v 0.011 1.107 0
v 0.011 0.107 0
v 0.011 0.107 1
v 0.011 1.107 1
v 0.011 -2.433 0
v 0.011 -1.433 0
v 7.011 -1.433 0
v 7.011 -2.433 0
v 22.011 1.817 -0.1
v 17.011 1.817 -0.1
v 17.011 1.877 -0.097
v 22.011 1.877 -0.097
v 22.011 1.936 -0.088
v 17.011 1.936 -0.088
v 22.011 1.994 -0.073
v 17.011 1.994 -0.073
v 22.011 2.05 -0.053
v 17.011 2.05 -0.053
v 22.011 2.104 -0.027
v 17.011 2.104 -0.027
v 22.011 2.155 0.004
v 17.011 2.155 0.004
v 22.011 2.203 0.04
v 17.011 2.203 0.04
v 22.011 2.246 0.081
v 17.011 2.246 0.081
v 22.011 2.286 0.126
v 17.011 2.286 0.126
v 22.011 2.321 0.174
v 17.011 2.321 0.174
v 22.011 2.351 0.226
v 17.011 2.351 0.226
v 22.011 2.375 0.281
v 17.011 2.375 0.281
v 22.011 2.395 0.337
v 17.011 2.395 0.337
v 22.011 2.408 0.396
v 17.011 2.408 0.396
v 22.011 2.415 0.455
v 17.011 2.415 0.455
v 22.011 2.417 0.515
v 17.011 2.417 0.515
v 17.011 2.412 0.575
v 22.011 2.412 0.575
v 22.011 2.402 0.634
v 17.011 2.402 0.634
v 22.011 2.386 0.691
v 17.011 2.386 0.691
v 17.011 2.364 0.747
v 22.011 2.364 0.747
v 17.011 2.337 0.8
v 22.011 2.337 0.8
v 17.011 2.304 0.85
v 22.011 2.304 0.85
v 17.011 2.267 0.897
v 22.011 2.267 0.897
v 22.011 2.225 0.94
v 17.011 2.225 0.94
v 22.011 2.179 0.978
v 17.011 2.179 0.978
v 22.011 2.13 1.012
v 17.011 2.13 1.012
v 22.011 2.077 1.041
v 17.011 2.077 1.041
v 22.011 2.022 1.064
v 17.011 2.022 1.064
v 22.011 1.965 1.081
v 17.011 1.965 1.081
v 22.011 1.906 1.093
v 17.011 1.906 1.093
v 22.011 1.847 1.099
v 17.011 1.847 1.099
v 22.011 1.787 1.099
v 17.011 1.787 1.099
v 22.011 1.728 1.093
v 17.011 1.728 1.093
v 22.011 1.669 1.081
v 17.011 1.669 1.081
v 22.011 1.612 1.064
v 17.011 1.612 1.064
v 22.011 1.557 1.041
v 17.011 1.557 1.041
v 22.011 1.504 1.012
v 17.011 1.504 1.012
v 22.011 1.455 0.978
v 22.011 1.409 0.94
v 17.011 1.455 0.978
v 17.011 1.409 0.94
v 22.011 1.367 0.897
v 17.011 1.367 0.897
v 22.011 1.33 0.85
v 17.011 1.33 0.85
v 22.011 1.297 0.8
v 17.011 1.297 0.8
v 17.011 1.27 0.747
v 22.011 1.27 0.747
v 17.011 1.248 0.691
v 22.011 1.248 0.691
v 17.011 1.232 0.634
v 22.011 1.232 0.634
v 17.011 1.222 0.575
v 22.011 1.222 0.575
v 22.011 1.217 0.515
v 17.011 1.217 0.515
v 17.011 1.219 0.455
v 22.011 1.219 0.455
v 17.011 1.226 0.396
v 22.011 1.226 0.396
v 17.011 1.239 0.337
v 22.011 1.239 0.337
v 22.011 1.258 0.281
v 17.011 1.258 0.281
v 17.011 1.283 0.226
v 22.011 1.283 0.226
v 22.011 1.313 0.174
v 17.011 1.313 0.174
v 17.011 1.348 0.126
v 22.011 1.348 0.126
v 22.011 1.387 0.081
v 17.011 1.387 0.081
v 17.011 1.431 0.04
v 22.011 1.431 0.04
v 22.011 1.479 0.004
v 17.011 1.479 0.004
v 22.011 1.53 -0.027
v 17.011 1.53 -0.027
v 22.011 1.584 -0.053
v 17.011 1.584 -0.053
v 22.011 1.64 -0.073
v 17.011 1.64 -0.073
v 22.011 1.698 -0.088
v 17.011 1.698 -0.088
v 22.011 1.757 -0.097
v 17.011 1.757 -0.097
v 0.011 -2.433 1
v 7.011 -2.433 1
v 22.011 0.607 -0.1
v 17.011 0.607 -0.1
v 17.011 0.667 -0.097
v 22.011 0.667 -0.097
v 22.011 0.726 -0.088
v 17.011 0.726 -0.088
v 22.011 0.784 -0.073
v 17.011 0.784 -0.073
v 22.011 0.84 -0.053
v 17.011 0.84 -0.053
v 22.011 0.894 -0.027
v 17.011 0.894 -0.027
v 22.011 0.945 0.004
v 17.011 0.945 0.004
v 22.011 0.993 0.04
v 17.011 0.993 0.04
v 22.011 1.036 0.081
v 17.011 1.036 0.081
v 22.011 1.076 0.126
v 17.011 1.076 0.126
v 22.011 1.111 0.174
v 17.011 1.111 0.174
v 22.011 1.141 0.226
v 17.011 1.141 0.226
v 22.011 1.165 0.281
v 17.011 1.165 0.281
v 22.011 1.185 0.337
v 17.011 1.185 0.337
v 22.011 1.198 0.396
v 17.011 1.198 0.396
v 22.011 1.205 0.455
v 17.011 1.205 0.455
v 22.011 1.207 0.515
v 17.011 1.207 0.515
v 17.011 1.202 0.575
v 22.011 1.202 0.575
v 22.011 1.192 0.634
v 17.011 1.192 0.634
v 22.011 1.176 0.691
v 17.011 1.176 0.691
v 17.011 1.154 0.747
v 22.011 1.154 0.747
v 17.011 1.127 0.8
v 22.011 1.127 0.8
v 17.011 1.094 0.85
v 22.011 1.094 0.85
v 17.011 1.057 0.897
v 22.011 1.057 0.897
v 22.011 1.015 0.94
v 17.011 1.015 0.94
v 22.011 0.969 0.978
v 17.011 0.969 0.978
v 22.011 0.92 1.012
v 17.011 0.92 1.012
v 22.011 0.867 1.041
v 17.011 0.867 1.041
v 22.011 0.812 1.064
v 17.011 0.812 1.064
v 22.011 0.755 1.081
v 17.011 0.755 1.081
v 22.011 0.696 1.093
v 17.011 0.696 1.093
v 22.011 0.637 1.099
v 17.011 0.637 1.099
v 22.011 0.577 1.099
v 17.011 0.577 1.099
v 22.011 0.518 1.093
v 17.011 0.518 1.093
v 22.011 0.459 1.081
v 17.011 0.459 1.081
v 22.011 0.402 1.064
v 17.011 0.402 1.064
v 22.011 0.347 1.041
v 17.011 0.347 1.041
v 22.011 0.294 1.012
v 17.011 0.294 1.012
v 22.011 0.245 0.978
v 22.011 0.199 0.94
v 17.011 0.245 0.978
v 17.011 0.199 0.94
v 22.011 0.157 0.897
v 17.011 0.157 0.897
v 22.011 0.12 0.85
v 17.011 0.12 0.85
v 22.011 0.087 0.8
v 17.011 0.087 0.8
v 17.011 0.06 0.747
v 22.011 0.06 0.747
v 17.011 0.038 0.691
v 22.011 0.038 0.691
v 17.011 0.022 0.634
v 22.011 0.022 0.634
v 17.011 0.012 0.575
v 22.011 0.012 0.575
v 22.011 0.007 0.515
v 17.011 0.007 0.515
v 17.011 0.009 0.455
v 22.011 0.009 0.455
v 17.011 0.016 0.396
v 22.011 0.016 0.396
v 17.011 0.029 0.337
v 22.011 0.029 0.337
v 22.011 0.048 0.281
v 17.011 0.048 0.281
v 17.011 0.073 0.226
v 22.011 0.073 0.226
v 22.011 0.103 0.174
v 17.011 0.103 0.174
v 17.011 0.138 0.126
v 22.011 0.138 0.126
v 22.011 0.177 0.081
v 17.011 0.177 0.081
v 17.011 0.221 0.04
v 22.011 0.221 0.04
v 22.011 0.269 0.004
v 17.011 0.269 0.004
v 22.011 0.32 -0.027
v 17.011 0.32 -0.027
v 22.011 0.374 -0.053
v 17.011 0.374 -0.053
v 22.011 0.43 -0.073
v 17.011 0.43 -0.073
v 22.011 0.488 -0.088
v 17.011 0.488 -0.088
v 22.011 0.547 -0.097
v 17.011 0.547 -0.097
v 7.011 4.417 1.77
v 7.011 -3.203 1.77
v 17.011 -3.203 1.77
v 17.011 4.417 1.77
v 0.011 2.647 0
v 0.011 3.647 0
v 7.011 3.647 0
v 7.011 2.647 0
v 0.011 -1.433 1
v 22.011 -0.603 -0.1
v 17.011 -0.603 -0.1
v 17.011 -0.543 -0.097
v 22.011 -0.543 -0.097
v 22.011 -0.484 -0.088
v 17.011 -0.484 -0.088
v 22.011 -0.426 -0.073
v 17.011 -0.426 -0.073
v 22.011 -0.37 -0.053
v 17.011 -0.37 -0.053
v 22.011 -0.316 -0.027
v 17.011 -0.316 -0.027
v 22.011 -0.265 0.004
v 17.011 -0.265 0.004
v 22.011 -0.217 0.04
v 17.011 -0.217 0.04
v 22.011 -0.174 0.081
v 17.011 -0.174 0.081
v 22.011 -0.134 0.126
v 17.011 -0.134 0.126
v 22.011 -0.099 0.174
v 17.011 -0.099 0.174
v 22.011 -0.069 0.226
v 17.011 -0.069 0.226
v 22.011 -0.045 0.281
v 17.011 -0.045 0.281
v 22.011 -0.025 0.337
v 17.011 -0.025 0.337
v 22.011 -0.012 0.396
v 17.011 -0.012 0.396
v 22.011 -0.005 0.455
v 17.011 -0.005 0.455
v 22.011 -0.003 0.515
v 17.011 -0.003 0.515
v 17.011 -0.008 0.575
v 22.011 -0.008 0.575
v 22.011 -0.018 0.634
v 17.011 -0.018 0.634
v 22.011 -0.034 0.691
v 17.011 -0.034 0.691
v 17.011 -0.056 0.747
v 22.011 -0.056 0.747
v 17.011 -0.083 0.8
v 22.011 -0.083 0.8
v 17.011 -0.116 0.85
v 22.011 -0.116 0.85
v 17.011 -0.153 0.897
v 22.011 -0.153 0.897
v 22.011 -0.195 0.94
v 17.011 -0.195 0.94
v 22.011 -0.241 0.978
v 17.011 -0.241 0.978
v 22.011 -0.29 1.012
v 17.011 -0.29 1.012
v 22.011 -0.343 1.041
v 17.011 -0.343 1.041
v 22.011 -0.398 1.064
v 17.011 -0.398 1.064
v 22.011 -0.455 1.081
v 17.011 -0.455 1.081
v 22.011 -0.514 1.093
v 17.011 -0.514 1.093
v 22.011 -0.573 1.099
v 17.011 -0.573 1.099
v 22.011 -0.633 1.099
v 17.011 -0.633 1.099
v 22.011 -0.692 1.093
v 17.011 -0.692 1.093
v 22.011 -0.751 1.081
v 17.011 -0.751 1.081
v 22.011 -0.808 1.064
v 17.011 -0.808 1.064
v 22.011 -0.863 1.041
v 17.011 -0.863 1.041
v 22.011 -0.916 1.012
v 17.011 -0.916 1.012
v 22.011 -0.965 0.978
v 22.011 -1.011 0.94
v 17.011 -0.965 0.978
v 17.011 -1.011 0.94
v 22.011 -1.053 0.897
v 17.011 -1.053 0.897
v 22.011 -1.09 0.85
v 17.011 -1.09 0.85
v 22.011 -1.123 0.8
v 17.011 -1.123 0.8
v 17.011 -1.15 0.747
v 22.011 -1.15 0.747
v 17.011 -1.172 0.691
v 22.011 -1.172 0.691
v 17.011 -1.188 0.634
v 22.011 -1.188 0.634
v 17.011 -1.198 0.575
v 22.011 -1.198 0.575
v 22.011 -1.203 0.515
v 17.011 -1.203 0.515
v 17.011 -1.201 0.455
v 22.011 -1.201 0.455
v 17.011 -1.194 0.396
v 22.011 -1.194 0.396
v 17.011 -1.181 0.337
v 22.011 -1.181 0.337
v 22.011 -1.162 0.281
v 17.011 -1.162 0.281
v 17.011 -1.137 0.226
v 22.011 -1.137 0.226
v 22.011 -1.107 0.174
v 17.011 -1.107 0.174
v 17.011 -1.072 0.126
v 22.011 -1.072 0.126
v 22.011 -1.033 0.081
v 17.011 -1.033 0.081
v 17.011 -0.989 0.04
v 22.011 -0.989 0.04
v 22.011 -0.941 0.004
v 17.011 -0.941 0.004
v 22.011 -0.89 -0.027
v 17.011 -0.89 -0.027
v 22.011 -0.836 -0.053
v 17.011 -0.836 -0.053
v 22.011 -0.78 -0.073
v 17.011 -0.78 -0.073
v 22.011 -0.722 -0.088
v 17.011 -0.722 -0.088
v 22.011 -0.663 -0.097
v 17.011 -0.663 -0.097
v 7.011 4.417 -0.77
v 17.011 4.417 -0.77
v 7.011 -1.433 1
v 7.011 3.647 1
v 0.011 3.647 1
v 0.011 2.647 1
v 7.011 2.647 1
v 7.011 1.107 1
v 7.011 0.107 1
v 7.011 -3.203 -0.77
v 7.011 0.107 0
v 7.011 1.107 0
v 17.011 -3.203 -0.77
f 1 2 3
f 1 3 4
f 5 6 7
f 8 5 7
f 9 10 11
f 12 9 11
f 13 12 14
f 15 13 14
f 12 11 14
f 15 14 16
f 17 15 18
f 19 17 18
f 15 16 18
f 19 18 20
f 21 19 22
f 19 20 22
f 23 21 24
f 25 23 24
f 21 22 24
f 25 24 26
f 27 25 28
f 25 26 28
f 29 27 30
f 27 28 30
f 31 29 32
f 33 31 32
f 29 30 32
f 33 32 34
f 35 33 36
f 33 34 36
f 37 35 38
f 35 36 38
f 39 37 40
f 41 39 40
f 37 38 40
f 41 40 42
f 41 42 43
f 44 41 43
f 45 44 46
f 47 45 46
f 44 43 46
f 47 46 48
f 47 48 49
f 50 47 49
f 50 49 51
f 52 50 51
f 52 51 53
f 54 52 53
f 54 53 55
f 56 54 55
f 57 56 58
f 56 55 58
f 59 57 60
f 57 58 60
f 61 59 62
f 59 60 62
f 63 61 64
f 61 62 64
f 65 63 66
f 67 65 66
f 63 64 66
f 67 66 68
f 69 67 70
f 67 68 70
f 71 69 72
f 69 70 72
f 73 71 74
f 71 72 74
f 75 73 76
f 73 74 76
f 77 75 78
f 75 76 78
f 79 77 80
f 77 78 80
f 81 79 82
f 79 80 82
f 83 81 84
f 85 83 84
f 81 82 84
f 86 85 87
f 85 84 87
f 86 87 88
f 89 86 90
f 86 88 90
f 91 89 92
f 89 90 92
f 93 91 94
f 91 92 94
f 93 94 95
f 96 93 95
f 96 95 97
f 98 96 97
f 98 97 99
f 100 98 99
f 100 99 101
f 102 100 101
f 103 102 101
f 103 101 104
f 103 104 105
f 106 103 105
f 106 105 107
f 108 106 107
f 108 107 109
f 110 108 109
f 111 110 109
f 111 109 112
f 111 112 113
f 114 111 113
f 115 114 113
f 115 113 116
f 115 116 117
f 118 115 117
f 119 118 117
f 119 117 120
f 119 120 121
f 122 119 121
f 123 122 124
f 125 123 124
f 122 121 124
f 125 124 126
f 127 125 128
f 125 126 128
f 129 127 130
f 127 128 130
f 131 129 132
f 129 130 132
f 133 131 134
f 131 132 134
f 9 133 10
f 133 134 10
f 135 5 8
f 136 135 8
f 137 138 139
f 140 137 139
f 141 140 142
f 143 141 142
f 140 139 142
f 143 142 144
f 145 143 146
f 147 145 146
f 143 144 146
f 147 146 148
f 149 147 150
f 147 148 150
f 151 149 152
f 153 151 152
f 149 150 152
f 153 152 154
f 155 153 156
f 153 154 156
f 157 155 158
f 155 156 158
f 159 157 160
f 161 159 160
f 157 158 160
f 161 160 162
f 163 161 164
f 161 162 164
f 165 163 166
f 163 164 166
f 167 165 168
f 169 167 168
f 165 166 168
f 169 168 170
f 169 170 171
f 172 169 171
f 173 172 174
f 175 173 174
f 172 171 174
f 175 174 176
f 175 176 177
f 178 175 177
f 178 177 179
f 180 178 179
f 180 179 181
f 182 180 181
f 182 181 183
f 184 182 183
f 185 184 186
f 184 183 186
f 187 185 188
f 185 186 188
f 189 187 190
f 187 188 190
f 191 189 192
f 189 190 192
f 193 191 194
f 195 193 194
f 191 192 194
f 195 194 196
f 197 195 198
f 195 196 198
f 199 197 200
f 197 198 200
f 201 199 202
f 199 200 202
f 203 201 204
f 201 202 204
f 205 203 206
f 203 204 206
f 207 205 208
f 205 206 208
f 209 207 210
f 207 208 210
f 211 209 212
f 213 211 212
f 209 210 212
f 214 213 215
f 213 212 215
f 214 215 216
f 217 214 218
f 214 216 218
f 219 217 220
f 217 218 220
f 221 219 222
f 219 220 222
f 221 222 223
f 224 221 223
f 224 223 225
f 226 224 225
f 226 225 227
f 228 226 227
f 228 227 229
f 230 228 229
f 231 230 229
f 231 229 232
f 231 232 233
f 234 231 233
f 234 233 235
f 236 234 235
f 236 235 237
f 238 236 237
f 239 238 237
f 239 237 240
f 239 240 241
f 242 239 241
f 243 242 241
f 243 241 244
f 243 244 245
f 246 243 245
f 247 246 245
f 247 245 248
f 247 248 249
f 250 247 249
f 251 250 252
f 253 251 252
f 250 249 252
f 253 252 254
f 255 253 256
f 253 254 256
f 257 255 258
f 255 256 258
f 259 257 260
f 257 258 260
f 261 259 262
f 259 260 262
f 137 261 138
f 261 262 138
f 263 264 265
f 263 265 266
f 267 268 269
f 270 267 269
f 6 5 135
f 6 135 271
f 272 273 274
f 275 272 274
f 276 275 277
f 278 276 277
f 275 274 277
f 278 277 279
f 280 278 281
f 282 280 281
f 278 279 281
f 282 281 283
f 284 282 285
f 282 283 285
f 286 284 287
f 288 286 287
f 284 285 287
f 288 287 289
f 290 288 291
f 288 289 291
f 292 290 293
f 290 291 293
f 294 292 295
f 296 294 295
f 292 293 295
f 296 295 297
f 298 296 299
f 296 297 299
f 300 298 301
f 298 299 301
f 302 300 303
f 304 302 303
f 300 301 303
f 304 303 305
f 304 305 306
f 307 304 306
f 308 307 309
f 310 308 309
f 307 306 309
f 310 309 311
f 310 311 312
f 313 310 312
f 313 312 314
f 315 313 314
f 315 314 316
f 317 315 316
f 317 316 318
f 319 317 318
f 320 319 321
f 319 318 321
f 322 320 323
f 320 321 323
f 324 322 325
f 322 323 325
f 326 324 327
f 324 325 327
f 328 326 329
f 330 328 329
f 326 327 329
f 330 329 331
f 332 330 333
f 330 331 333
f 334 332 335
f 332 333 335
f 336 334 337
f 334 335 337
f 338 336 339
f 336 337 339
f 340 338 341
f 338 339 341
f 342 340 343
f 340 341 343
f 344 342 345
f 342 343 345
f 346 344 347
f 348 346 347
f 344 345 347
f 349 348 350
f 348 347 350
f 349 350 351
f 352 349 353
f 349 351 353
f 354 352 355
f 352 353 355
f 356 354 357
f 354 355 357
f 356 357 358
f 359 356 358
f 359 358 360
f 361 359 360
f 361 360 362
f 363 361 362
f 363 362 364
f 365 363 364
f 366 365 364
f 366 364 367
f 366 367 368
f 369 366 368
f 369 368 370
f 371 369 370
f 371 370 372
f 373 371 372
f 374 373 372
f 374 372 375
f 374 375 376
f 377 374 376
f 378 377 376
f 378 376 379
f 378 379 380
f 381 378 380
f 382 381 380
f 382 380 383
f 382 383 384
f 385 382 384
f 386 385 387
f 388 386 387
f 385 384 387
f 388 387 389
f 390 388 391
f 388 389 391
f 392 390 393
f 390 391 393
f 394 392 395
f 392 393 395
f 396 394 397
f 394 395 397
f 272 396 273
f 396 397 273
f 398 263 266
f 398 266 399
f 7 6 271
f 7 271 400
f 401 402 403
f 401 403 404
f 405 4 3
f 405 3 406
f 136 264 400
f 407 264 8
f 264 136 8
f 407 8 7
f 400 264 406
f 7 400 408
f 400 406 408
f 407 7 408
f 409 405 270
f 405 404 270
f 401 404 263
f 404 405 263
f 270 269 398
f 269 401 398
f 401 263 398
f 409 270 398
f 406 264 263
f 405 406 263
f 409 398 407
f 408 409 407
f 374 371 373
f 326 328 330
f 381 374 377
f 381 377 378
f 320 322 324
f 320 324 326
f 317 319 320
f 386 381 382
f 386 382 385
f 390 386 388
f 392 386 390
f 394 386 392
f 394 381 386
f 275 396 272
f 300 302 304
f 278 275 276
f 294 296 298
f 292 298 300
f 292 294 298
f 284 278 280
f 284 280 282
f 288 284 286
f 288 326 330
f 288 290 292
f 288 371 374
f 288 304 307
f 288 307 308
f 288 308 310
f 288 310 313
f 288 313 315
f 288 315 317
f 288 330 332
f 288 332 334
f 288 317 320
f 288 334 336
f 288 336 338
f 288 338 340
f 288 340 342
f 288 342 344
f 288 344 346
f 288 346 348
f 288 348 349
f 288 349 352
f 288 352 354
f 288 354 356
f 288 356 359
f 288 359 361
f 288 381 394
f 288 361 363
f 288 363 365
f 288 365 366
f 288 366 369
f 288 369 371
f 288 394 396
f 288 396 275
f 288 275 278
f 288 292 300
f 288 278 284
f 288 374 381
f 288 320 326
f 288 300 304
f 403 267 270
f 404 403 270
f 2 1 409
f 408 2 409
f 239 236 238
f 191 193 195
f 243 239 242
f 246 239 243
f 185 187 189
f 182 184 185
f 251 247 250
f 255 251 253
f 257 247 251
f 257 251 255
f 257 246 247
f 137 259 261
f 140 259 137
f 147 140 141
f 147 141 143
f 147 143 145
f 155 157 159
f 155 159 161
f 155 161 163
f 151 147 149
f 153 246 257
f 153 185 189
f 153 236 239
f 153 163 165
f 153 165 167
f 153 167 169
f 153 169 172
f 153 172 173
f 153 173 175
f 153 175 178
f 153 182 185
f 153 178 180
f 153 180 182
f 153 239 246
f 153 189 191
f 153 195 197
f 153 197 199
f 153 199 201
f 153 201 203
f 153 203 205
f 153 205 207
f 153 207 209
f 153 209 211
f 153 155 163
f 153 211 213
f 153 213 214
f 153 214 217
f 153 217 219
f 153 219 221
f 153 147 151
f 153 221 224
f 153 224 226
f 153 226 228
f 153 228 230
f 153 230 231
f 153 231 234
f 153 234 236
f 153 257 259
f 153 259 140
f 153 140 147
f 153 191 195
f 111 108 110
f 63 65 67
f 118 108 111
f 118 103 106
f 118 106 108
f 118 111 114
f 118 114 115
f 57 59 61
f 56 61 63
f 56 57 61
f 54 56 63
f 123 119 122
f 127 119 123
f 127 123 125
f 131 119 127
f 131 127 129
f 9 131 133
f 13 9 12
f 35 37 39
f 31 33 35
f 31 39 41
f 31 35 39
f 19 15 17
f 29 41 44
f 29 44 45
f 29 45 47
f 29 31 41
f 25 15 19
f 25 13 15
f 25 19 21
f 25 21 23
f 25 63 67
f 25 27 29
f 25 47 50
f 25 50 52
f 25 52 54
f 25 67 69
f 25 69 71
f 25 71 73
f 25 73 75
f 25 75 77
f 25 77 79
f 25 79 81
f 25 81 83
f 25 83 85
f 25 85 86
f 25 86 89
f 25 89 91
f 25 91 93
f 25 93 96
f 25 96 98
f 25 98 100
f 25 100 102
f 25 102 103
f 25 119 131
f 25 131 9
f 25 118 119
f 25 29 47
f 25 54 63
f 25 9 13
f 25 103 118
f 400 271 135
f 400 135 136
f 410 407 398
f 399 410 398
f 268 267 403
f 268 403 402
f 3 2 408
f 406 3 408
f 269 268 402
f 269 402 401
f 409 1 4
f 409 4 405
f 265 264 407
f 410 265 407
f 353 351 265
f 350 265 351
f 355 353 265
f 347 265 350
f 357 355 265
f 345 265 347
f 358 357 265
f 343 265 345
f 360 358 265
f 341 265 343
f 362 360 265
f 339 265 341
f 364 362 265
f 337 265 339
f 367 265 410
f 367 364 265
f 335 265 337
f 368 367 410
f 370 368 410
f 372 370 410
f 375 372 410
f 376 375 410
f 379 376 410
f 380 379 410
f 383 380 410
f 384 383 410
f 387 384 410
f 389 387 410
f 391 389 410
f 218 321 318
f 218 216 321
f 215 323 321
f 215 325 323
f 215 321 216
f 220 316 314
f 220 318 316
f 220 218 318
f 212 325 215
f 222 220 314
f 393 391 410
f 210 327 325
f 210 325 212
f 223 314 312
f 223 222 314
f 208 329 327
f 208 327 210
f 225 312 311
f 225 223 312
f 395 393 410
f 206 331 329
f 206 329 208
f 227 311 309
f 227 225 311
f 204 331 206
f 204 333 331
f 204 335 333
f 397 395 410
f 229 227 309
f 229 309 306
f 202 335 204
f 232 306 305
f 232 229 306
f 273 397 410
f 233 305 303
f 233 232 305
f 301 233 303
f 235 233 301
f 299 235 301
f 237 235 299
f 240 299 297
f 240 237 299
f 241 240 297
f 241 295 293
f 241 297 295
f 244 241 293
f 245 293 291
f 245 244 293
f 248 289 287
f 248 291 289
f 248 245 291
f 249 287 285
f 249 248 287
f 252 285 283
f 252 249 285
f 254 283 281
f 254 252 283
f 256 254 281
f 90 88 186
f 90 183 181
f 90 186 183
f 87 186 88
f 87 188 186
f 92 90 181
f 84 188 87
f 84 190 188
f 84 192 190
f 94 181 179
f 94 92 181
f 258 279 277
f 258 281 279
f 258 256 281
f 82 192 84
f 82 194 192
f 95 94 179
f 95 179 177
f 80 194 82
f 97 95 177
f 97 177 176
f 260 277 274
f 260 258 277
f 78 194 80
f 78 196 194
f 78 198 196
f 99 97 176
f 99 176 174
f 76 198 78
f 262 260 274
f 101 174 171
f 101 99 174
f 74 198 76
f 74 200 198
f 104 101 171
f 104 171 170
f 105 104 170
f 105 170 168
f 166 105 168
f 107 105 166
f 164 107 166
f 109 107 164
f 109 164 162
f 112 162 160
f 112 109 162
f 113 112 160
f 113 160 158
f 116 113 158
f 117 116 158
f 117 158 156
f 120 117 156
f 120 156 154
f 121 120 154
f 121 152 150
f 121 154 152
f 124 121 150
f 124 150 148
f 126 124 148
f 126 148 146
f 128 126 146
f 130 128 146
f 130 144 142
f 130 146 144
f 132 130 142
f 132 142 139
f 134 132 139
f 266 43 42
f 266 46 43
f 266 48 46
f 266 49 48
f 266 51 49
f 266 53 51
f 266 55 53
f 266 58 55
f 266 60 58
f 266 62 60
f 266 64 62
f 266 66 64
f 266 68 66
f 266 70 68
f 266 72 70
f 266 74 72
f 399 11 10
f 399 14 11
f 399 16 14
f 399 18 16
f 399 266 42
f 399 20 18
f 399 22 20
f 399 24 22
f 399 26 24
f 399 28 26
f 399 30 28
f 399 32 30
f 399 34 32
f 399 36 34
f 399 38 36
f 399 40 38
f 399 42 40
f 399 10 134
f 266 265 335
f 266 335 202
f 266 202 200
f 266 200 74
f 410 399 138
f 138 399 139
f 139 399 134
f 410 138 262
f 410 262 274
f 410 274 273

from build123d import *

# Parameters (mm, degrees)
CROQUIS5_W                = 7
CROQUIS5_H                = 1
SALIENTE_EXTRUIR1_DEPTH   = 1
SALIENTE_EXTRUIR1_2_DEPTH = 1
SALIENTE_EXTRUIR1_3_DEPTH = 1
CROQUIS14_W               = 2.54
CROQUIS14_H               = 7.62
SALIENTE_EXTRUIR2_DEPTH   = 10
CROQUIS16_R               = 0.6
SALIENTE_EXTRUIR4_DEPTH   = 5


with BuildPart() as part:
    # Croquis5 → Saliente-Extruir1 (new body)
    with BuildSketch(Plane.XY):
        with Locations((3.511240097, -1.933057617)):
            Rectangle(CROQUIS5_W, CROQUIS5_H)
    extrude(amount=SALIENTE_EXTRUIR1_DEPTH)



with BuildPart() as body_2:
    # Croquis5 → Saliente-Extruir1 2 (new body)
    with BuildSketch(Plane.XY):
        with Locations((3.511240097, 0.606942383)):
            Rectangle(CROQUIS5_W, CROQUIS5_H)
    extrude(amount=SALIENTE_EXTRUIR1_2_DEPTH)


with BuildPart() as body_3:
    # Croquis5 → Saliente-Extruir1 3 (new body)
    with BuildSketch(Plane.XY):
        with Locations((3.511240097, 3.146942383)):
            Rectangle(CROQUIS5_W, CROQUIS5_H)
    extrude(amount=SALIENTE_EXTRUIR1_3_DEPTH)


with BuildPart() as part_1:
    add(part.part)

    add(body_2.part)  # Saliente-Extruir2 merges body 2

    add(body_3.part)  # Saliente-Extruir2 merges body 3
    # Croquis14 → Saliente-Extruir2 (add)
    with BuildSketch(Plane(origin=(7.011240097, 0, 0), x_dir=(0, 0, -1), z_dir=(1, 0, 0))):
        with Locations((-0.5, 0.606942383)):
            Rectangle(CROQUIS14_W, CROQUIS14_H)
    extrude(amount=SALIENTE_EXTRUIR2_DEPTH)

    # Croquis16 → Saliente-Extruir4 (add)
    with BuildSketch(Plane(origin=(17.011240097, 0, 0), x_dir=(0, 0, -1), z_dir=(1, 0, 0))):
        with Locations((-0.5, 0.606942383)):
            Circle(CROQUIS16_R)
        with Locations((-0.5, 1.816942383)):
            Circle(CROQUIS16_R)
        with Locations((-0.5, -0.603057617)):
            Circle(CROQUIS16_R)
    extrude(amount=SALIENTE_EXTRUIR4_DEPTH)


solid = part_1.part
